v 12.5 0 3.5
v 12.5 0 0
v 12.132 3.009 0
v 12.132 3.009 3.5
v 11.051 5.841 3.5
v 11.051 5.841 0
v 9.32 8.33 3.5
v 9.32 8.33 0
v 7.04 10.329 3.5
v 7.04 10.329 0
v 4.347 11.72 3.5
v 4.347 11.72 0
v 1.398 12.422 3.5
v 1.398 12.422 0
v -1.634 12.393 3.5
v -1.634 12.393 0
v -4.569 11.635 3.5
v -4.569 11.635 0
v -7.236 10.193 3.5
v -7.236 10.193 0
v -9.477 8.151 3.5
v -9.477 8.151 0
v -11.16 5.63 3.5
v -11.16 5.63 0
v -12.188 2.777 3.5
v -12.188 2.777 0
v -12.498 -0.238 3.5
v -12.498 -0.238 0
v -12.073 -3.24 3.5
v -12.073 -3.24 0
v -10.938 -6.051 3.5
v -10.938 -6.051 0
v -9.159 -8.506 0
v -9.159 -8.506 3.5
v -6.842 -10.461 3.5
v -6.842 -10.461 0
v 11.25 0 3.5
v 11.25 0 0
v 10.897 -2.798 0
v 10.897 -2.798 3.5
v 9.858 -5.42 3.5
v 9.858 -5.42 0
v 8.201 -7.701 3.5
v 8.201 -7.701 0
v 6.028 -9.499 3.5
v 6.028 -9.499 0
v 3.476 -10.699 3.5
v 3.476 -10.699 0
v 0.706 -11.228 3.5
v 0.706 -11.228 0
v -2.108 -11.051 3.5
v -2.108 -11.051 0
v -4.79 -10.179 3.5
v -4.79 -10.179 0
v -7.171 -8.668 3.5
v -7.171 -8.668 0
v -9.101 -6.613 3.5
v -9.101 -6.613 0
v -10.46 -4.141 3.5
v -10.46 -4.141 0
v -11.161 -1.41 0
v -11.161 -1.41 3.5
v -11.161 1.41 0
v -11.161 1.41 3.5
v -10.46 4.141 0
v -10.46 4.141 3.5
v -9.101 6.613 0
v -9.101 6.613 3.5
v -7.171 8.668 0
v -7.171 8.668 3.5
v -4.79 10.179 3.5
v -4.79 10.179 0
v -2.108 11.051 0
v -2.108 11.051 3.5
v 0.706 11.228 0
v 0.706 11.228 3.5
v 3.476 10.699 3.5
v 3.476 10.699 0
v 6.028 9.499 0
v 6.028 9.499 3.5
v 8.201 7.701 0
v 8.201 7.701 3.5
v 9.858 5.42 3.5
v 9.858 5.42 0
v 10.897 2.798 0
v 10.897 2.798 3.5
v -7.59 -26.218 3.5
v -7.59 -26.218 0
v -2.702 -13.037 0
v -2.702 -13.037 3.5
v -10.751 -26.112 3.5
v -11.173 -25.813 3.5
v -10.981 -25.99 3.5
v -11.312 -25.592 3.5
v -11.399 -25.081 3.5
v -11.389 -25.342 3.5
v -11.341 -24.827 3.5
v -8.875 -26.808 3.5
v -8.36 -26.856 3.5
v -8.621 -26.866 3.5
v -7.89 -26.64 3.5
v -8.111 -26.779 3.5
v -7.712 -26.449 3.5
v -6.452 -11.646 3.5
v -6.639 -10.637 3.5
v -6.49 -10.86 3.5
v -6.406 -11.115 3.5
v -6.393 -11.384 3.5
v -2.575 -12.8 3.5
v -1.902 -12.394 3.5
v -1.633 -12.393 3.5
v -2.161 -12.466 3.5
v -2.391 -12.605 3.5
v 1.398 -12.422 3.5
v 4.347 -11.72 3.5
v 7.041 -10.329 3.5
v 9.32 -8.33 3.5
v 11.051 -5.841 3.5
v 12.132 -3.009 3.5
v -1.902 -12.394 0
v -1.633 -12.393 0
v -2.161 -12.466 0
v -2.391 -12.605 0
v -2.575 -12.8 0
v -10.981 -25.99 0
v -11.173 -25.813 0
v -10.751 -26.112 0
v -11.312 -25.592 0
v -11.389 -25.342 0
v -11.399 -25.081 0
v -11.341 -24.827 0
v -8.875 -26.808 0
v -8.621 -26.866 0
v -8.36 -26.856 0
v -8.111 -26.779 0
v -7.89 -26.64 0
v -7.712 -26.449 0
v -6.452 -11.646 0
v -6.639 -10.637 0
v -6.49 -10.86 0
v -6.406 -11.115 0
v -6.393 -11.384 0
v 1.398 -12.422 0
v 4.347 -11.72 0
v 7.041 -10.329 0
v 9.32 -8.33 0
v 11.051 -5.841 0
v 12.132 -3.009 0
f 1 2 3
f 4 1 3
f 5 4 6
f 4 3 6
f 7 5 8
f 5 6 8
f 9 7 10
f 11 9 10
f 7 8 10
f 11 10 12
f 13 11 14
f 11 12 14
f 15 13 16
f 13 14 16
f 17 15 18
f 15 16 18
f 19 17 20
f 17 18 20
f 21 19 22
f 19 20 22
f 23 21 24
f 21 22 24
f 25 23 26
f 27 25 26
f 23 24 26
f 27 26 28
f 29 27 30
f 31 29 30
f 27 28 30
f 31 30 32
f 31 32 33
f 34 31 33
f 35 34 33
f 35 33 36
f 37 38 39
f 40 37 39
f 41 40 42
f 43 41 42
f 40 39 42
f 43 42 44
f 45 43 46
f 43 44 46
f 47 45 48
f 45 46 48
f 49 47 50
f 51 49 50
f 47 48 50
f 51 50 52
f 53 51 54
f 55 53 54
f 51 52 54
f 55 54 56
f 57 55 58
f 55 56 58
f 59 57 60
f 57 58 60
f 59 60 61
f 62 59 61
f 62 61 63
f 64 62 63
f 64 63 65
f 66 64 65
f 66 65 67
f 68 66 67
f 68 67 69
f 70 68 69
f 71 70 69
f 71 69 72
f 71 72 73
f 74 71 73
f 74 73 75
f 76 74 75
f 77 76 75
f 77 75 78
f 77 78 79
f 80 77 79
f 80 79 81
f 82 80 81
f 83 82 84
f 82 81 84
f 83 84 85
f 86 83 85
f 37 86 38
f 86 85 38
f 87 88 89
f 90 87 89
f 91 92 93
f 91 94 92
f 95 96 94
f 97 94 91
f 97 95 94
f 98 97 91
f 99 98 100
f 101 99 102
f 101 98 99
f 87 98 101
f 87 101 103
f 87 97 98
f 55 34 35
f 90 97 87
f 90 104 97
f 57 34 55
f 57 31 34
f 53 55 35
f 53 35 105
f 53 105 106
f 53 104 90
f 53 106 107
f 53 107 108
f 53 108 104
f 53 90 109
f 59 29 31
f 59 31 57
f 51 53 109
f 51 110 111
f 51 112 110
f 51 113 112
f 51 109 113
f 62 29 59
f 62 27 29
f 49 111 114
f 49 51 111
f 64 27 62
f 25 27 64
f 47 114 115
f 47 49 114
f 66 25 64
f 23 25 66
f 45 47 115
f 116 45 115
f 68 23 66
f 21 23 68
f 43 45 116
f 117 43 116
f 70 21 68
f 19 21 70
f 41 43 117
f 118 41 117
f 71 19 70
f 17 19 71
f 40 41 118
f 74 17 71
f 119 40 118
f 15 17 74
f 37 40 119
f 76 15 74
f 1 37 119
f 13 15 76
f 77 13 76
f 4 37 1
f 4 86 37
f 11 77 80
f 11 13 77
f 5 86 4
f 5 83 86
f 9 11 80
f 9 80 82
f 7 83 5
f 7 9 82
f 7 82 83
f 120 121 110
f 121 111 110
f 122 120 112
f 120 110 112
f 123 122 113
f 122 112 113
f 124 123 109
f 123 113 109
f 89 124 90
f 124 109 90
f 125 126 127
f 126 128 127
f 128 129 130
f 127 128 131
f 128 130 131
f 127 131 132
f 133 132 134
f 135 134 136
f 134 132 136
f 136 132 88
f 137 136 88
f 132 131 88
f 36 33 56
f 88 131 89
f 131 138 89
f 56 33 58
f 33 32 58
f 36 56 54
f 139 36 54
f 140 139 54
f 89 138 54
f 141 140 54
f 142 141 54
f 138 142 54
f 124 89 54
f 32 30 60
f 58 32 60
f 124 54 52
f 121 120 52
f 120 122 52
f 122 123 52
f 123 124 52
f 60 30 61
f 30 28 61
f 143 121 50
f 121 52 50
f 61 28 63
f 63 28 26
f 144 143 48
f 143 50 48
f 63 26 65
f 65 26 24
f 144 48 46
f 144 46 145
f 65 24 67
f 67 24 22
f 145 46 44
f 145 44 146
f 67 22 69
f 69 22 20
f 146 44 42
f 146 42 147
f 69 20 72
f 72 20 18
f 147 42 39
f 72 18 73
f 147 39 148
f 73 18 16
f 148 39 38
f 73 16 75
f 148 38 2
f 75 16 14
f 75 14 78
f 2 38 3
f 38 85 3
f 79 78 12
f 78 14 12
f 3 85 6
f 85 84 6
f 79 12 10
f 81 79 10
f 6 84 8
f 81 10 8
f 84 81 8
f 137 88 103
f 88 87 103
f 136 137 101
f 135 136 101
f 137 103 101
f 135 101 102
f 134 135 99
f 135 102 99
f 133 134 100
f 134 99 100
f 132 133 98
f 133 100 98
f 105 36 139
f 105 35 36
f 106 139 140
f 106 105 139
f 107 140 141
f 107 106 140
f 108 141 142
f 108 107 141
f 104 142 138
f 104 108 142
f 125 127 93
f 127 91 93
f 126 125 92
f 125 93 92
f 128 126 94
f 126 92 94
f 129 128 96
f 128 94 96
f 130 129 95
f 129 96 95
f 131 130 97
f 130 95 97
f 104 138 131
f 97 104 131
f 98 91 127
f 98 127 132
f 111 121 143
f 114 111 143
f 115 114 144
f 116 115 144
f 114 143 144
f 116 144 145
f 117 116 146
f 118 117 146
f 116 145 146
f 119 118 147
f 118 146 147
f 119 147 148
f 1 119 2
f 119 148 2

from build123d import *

# Parameters (mm, degrees)
F1_DEPTH = 3.5
F2_R     = 11.25
F3_DEPTH = 3.501
F4_R     = 1


with BuildPart() as f1:
    # F0 (on Top) → F1 (new body)
    with BuildSketch(Plane.XY):
        with BuildLine():
            ThreePointArc((-2.415318, -12.26443), (7.939097, -9.655089), (12.5, 0))
            ThreePointArc((12.5, 0), (-6.292003, 10.800958), (-6.165711, -10.873546))
            ThreePointArc((-6.165711, -10.873546), (-4.346511, -11.719976), (-2.415318, -12.26443))
        make_face()
        with BuildLine():
            ThreePointArc((-2.415318, -12.26443), (-4.346511, -11.719976), (-6.165711, -10.873546))
            Line((-6.165711, -10.873546), (-11.688228, -25.764521))
            Line((-11.688228, -25.764521), (-7.937836, -27.155404))
            Line((-7.937836, -27.155404), (-2.415318, -12.26443))
        make_face()
    extrude(amount=F1_DEPTH)

    # F2 (on face) → F3 (cut, through all)
    with BuildSketch(Plane(origin=(0, 0, 0), x_dir=(1, 0, 0), z_dir=(0, 0, -1))):
        Circle(F2_R)
    extrude(amount=-F3_DEPTH, mode=Mode.SUBTRACT)

    # F4
    f4_edges = [f1.edges().sort_by_distance(p)[0] for p in [
        (-7.937836, -27.155404, 1.75),
        (-11.688228, -25.764521, 1.75),
        (-2.415318, -12.26443, 1.75),
        (-6.165711, -10.873546, 1.75),
    ]]
    fillet(f4_edges, radius=F4_R)


solid = f1.part
